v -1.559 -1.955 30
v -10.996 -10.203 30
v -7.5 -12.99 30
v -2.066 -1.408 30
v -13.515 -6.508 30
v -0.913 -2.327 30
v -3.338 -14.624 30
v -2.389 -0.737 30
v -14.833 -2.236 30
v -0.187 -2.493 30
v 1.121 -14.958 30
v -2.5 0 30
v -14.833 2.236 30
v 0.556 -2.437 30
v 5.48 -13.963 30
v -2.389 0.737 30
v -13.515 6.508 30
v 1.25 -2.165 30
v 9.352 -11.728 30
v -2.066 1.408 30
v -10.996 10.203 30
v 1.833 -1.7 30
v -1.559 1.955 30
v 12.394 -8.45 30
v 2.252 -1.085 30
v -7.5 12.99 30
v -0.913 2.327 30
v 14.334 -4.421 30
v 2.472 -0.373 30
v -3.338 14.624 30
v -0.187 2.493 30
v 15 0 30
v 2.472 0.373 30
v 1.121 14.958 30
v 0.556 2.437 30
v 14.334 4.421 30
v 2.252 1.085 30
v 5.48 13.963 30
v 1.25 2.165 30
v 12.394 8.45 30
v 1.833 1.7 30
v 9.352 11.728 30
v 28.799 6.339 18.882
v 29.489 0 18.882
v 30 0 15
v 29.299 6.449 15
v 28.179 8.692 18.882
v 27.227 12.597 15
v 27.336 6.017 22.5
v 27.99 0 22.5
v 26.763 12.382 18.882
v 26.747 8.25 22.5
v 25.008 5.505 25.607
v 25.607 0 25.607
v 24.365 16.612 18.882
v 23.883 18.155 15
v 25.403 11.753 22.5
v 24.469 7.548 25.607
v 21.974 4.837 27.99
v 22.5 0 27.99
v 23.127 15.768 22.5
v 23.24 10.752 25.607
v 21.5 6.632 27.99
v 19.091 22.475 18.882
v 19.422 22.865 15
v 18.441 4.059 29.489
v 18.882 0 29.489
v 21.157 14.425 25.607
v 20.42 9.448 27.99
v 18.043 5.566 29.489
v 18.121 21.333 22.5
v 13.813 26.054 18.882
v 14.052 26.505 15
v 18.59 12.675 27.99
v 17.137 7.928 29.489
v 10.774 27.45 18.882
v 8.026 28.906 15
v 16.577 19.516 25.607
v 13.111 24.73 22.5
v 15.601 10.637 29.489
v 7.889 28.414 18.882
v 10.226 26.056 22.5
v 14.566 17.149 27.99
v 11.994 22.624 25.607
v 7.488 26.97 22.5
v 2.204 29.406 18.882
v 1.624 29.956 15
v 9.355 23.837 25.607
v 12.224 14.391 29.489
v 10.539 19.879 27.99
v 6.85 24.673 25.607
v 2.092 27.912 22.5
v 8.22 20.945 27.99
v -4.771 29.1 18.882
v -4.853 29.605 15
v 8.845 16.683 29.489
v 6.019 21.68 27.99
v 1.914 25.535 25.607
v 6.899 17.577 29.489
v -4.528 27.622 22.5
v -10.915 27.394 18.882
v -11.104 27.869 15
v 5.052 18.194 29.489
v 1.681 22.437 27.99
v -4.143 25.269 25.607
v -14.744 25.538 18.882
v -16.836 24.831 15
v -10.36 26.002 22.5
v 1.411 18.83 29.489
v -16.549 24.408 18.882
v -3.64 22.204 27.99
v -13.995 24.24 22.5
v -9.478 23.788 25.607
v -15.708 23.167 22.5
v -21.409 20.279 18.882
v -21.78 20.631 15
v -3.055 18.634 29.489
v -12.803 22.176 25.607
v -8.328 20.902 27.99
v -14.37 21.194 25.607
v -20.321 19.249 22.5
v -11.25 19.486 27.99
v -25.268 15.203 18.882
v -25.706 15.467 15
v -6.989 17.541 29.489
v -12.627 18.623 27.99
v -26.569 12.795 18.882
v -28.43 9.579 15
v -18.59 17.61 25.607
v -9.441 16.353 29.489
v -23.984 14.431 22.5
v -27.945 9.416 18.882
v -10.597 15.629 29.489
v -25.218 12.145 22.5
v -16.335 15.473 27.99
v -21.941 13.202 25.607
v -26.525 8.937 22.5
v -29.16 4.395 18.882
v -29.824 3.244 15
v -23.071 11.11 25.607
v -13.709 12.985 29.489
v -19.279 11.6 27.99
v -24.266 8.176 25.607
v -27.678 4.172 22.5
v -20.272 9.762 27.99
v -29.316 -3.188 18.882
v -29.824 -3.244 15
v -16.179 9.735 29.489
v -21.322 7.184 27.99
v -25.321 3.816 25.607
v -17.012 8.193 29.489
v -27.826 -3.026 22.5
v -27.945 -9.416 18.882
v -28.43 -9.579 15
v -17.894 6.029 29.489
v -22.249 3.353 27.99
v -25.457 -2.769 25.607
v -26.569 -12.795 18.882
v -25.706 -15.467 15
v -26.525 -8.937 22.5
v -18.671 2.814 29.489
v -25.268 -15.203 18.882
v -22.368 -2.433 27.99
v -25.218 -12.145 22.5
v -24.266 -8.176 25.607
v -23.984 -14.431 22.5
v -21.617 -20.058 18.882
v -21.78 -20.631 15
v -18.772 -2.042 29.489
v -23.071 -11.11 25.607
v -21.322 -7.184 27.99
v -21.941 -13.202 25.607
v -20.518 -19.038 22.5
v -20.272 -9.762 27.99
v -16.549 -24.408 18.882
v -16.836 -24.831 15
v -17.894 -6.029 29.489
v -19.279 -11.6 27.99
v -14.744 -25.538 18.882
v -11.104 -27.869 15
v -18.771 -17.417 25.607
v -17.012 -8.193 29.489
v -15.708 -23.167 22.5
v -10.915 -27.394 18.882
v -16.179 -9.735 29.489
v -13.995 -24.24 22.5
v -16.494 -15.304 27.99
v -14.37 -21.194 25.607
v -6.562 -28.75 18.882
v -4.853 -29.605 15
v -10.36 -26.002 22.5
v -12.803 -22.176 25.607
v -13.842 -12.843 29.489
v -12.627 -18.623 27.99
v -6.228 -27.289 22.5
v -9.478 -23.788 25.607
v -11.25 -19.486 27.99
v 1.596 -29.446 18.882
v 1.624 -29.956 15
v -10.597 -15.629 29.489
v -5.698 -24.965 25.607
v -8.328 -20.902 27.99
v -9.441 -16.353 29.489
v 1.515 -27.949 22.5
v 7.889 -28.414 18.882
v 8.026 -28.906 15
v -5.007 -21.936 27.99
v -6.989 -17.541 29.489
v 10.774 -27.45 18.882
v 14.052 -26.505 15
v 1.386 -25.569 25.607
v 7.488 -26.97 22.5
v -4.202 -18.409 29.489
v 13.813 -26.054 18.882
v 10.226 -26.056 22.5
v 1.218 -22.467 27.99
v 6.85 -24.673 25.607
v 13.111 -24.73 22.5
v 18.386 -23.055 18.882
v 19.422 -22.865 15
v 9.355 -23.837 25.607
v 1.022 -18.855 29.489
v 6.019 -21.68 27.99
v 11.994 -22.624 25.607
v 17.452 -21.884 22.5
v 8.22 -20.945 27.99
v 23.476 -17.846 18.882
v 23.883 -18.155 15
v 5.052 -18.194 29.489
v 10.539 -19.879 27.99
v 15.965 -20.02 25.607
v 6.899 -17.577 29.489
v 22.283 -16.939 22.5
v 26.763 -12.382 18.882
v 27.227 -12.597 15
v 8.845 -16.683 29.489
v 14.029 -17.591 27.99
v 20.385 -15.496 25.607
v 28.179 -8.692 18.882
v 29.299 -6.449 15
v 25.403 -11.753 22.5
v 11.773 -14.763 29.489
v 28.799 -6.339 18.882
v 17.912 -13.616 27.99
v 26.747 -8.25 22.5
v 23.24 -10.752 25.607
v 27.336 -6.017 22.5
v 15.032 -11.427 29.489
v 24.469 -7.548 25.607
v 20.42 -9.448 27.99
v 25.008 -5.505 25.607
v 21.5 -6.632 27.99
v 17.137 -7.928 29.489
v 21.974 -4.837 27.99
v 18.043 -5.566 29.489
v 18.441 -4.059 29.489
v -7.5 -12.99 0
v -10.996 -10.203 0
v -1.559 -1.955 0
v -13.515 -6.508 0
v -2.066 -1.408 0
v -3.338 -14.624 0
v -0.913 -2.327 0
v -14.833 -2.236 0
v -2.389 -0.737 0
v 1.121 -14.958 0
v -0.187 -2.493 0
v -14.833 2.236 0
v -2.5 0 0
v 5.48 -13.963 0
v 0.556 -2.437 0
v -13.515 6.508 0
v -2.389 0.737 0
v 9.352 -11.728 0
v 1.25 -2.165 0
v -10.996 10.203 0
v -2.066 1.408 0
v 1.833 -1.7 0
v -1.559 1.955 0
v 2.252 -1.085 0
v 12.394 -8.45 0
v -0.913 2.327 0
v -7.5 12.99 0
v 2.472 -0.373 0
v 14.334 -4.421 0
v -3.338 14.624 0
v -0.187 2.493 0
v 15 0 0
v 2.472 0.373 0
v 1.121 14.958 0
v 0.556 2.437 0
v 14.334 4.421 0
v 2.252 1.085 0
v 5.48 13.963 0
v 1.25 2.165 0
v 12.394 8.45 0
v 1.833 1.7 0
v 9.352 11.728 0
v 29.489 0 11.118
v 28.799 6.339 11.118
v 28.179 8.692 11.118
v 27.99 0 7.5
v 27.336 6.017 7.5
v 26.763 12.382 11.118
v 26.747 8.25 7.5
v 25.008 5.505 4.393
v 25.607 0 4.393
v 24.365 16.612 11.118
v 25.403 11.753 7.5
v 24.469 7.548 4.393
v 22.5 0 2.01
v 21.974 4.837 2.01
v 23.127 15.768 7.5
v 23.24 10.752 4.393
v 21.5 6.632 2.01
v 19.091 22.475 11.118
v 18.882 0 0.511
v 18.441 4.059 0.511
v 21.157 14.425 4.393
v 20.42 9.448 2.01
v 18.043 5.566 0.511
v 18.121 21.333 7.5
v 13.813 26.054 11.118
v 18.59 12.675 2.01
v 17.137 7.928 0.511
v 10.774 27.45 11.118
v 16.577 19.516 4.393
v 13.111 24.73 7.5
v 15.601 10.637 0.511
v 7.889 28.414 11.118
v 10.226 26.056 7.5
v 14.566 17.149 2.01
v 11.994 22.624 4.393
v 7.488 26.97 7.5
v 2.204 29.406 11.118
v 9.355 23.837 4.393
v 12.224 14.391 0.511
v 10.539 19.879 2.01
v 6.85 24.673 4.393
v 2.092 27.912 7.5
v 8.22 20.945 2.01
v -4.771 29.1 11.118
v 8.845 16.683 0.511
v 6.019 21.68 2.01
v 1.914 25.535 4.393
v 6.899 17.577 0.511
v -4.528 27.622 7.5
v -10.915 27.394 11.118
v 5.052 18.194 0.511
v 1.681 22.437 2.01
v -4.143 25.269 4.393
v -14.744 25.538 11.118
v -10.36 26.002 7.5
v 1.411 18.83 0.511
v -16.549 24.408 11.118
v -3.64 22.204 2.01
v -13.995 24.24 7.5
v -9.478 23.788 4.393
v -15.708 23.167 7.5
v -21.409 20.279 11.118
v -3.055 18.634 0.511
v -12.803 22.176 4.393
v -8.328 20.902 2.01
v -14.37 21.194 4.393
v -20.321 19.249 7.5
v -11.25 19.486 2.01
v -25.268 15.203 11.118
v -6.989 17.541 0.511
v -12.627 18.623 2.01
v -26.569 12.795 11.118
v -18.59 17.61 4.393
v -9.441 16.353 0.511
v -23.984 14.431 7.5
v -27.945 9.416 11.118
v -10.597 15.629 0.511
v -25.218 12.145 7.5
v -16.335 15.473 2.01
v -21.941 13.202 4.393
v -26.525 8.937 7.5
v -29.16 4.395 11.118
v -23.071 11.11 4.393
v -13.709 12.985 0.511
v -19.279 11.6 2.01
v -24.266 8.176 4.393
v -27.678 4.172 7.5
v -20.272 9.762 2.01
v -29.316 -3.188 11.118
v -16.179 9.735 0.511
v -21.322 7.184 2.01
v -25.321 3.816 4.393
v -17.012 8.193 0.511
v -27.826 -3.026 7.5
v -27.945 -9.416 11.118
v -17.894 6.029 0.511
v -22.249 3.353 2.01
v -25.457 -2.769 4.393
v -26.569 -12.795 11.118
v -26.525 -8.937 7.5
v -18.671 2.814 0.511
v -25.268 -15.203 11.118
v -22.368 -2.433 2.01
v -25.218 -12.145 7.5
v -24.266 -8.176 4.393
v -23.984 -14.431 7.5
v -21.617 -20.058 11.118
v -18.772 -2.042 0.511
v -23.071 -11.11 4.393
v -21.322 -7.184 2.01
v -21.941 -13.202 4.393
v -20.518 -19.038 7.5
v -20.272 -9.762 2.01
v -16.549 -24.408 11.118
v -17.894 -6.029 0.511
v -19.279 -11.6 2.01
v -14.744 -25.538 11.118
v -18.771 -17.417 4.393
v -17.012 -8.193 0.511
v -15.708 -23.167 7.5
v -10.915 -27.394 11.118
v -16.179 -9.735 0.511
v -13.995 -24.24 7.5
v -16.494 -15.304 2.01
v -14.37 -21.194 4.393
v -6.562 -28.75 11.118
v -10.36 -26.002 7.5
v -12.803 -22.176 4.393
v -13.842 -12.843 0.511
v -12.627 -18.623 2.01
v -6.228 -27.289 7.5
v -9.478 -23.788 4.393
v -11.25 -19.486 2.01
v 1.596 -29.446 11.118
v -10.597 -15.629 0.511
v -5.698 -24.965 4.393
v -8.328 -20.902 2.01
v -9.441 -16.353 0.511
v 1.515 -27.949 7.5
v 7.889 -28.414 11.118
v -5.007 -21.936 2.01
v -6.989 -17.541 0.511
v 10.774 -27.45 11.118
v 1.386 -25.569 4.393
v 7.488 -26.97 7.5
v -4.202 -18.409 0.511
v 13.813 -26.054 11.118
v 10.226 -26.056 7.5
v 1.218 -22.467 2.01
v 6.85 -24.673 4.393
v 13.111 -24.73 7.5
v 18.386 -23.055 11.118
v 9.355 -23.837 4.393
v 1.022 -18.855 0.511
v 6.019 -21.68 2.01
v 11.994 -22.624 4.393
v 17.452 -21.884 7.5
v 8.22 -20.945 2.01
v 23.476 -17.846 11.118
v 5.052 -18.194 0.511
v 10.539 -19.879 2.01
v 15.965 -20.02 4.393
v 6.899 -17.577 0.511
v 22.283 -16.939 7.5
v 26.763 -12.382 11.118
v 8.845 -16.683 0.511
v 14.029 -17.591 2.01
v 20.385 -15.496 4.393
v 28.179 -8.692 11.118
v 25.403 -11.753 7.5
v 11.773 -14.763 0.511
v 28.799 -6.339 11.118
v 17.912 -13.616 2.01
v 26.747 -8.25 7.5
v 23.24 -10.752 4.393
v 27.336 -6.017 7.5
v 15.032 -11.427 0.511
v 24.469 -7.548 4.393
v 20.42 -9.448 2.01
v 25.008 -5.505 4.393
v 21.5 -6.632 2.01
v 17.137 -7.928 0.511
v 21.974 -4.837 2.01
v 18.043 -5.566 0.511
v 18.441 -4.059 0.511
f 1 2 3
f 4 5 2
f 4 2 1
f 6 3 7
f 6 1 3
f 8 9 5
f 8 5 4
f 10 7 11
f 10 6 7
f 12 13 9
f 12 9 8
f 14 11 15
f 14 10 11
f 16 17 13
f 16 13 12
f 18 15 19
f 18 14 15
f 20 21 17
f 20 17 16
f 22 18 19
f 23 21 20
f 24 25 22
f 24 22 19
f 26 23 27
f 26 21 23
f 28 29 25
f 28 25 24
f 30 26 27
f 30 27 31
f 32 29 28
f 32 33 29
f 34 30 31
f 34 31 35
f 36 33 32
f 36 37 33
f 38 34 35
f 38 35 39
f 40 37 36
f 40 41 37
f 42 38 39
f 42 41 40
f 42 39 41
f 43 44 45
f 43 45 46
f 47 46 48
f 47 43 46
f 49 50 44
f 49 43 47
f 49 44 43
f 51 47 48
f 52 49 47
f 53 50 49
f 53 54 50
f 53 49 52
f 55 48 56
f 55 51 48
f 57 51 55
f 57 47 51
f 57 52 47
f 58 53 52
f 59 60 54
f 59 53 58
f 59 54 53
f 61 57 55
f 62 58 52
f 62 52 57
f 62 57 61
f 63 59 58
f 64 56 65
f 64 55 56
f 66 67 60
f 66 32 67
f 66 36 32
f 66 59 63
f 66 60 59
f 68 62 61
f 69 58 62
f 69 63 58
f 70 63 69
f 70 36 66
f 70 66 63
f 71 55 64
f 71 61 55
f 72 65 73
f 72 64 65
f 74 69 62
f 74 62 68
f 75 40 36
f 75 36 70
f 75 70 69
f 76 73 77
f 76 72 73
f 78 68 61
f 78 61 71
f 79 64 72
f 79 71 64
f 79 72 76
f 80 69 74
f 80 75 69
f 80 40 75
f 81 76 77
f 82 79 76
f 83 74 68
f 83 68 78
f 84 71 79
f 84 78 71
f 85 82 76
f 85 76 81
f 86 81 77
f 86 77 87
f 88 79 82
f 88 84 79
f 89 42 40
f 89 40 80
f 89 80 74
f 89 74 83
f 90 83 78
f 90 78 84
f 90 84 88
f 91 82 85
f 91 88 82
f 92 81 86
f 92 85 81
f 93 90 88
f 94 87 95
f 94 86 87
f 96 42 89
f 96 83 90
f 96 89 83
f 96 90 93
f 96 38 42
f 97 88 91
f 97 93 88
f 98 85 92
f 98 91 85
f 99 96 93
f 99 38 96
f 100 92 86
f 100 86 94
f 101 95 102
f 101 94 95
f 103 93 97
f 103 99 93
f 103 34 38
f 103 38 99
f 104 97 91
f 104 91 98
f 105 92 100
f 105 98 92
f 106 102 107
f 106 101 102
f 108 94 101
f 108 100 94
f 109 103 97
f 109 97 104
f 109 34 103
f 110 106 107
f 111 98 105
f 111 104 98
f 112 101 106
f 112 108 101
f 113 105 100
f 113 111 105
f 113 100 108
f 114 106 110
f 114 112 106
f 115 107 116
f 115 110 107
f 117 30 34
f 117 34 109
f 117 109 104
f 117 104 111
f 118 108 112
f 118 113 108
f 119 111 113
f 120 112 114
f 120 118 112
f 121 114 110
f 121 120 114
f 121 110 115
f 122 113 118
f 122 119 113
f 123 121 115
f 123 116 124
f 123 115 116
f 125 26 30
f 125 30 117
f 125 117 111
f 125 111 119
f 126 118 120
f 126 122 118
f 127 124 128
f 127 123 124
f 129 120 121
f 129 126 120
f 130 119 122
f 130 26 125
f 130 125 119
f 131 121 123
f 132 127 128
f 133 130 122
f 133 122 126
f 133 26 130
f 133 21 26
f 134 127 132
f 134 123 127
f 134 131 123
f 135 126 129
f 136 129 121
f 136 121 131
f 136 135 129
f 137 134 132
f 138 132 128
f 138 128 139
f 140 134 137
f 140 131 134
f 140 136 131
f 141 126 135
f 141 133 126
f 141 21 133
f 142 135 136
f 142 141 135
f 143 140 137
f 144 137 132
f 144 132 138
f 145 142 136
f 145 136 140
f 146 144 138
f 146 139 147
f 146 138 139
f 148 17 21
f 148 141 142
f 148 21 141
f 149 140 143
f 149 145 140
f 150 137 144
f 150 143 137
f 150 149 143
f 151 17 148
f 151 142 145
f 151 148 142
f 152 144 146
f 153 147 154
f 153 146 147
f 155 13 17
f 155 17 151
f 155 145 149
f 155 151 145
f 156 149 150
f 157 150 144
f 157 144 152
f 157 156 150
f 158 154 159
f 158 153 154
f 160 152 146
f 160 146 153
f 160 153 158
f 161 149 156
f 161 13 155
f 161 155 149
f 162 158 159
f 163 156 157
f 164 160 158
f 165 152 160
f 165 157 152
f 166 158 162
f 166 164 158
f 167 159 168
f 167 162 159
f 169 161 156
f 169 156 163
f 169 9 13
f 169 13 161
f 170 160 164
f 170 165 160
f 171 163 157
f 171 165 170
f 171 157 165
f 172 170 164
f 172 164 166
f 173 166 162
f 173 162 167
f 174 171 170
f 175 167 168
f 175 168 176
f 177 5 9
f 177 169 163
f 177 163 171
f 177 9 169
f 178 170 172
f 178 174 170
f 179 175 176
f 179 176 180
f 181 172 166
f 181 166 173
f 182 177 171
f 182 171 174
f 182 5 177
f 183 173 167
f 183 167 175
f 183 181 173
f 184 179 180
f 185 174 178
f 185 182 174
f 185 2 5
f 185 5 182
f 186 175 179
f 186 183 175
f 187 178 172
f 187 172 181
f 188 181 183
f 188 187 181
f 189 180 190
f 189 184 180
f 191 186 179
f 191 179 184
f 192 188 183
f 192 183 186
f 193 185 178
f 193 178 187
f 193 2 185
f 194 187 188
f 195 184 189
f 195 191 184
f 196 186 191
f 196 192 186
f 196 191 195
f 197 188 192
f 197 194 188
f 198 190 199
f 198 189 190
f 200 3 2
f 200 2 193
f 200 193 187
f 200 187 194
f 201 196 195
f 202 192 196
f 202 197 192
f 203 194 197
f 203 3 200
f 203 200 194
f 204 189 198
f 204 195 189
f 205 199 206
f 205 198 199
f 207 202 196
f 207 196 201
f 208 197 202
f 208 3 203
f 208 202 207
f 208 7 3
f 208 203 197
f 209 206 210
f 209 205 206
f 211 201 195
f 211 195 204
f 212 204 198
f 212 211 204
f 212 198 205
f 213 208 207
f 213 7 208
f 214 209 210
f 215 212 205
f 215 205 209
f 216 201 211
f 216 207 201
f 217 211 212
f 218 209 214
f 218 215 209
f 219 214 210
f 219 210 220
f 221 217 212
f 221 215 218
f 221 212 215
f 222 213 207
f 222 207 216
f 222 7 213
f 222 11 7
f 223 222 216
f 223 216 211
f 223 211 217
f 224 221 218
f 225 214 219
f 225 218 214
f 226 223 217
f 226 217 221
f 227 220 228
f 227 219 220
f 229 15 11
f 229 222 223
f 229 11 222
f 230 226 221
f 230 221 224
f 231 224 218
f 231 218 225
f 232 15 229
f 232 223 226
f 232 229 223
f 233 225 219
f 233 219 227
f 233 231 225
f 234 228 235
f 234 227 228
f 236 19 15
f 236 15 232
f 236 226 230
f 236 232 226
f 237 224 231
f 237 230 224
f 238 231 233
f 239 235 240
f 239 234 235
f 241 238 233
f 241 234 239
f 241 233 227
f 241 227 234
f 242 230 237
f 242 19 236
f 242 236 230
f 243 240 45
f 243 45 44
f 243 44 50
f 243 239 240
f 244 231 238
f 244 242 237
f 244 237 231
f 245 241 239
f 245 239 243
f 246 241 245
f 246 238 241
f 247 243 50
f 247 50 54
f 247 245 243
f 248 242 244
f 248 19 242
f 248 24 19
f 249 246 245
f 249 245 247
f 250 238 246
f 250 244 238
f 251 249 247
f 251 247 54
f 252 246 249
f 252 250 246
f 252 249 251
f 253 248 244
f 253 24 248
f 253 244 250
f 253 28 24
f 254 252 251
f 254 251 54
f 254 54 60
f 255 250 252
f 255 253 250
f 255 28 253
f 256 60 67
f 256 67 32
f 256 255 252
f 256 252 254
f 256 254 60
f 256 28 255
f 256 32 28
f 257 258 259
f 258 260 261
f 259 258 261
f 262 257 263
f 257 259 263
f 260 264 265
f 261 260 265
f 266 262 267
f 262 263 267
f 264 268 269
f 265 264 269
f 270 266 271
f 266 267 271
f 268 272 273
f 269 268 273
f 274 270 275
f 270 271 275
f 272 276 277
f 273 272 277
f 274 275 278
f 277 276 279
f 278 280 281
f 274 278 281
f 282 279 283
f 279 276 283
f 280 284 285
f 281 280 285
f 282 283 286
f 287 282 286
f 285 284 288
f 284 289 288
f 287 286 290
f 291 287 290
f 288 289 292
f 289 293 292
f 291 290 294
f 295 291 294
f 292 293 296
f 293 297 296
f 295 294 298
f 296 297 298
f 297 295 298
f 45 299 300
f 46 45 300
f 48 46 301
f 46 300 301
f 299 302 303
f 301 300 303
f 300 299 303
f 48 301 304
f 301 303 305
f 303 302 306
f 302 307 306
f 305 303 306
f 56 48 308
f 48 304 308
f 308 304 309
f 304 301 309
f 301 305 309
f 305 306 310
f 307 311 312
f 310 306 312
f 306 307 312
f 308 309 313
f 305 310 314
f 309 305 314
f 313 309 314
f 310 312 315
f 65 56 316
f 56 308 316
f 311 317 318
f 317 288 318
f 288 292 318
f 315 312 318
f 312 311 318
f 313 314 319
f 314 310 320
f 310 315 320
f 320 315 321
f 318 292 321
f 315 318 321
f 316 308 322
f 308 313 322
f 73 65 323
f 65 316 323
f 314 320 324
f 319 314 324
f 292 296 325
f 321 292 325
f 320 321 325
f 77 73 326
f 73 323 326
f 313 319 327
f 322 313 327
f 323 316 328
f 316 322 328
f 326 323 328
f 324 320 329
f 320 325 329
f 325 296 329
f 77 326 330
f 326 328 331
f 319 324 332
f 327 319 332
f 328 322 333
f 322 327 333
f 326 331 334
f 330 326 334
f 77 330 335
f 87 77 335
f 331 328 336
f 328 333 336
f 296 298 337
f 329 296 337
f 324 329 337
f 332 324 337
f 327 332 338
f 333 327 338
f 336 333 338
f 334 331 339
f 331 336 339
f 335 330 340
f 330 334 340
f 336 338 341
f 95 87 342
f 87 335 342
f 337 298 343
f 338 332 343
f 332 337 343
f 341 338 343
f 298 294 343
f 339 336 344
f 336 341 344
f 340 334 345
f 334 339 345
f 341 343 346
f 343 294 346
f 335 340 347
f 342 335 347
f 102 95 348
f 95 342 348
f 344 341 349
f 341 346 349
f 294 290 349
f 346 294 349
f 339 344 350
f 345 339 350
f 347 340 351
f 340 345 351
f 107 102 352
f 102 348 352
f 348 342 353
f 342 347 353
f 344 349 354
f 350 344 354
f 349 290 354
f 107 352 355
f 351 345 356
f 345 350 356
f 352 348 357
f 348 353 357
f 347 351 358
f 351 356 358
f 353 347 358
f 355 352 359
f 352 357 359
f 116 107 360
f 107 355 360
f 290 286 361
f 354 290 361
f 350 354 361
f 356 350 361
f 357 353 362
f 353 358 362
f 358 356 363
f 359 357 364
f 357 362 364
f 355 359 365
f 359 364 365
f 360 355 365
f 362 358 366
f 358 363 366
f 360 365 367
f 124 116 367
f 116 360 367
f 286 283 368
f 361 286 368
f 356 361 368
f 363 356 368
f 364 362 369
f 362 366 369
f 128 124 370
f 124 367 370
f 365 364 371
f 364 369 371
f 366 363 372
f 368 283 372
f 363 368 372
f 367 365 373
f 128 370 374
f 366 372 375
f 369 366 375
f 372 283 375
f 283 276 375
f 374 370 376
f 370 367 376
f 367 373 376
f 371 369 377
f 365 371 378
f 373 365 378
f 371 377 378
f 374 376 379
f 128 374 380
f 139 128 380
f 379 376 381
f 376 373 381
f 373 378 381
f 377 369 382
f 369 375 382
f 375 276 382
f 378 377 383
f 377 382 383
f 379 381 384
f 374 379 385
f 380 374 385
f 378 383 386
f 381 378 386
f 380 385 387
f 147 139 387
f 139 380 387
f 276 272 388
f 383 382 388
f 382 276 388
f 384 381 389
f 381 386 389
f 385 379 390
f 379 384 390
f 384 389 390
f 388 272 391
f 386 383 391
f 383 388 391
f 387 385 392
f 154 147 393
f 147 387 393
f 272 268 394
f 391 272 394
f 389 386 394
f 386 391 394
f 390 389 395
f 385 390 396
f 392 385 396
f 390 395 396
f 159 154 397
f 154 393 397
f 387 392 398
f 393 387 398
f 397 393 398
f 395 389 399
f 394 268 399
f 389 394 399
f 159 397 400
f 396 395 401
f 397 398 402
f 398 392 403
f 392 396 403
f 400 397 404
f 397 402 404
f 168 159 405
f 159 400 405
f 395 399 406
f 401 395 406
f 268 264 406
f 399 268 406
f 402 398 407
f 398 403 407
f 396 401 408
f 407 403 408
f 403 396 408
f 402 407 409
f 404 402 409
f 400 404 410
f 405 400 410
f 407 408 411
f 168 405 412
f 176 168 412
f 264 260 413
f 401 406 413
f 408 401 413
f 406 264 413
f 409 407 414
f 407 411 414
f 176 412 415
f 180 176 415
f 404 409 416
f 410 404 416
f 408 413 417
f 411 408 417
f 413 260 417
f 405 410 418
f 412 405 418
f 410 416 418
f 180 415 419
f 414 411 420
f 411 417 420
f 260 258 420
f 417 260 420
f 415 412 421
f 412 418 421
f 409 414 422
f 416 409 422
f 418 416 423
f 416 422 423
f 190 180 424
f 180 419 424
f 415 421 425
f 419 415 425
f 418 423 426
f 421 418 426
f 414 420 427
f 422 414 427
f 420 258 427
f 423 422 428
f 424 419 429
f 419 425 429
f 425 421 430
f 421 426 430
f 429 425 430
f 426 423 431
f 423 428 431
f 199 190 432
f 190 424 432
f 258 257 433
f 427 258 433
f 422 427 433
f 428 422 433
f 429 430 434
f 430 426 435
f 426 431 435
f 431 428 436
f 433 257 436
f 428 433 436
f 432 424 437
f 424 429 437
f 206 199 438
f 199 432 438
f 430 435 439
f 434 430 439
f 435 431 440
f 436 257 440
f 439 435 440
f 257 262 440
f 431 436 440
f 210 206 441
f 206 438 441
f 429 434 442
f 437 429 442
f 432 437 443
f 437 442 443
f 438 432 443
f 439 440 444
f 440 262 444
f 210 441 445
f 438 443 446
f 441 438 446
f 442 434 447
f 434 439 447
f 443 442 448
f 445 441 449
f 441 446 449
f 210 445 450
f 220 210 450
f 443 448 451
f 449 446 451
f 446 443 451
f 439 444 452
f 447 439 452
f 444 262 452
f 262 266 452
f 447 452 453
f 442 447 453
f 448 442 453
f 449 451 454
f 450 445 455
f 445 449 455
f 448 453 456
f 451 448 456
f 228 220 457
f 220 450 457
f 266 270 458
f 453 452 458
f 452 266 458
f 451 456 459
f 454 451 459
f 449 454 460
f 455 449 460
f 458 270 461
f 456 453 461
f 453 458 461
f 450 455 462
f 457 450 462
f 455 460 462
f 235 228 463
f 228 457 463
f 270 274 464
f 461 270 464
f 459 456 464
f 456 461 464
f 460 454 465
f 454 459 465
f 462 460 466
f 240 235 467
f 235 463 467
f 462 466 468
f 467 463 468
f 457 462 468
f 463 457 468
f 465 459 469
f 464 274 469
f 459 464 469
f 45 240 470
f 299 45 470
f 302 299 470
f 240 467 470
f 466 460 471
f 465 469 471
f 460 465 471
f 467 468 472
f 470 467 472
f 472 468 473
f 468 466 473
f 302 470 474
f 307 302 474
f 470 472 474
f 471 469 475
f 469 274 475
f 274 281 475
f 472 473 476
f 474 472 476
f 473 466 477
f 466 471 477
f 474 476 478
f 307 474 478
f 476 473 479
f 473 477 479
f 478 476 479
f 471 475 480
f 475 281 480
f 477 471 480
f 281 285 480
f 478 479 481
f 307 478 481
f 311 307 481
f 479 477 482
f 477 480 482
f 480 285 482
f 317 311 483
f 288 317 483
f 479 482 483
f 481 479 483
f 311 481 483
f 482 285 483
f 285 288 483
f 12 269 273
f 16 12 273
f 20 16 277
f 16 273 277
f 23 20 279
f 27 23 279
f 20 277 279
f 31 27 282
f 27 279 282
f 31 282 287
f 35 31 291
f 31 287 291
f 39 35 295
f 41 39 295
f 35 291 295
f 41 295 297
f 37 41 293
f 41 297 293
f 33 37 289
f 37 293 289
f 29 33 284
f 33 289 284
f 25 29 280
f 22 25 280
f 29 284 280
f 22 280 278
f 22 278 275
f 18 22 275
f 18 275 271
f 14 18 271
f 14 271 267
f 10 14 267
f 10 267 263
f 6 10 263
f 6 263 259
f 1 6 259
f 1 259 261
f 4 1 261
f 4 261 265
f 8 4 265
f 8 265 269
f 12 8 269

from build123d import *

# Parameters (mm, degrees)
SKETCH1_R           = 30
BOSS_EXTRUDE1_DEPTH = 30
FILLET1_R           = 15
SKETCH2_R           = 2.5
CUT_EXTRUDE1_DEPTH  = 52.961524227


with BuildPart() as part:
    # Sketch1 → Boss-Extrude1 (new body)
    with BuildSketch(Plane.XY):
        Circle(SKETCH1_R)
    extrude(amount=BOSS_EXTRUDE1_DEPTH)

    # Fillet1
    fillet1_edges = [part.edges().sort_by_distance(p)[0] for p in [
        (-30, 0, 0),
        (-30, 0, 30),
    ]]
    fillet(fillet1_edges, radius=FILLET1_R - 0.0001)  # a hair under: the kernel refuses the full size

    # Sketch2 → Cut-Extrude1 (cut, through all)
    with BuildSketch(Plane(origin=(0, 0, 0), x_dir=(-1, 0, 0), z_dir=(0, 0, -1))):
        Circle(SKETCH2_R)
    extrude(amount=-CUT_EXTRUDE1_DEPTH, mode=Mode.SUBTRACT)


solid = part.part
